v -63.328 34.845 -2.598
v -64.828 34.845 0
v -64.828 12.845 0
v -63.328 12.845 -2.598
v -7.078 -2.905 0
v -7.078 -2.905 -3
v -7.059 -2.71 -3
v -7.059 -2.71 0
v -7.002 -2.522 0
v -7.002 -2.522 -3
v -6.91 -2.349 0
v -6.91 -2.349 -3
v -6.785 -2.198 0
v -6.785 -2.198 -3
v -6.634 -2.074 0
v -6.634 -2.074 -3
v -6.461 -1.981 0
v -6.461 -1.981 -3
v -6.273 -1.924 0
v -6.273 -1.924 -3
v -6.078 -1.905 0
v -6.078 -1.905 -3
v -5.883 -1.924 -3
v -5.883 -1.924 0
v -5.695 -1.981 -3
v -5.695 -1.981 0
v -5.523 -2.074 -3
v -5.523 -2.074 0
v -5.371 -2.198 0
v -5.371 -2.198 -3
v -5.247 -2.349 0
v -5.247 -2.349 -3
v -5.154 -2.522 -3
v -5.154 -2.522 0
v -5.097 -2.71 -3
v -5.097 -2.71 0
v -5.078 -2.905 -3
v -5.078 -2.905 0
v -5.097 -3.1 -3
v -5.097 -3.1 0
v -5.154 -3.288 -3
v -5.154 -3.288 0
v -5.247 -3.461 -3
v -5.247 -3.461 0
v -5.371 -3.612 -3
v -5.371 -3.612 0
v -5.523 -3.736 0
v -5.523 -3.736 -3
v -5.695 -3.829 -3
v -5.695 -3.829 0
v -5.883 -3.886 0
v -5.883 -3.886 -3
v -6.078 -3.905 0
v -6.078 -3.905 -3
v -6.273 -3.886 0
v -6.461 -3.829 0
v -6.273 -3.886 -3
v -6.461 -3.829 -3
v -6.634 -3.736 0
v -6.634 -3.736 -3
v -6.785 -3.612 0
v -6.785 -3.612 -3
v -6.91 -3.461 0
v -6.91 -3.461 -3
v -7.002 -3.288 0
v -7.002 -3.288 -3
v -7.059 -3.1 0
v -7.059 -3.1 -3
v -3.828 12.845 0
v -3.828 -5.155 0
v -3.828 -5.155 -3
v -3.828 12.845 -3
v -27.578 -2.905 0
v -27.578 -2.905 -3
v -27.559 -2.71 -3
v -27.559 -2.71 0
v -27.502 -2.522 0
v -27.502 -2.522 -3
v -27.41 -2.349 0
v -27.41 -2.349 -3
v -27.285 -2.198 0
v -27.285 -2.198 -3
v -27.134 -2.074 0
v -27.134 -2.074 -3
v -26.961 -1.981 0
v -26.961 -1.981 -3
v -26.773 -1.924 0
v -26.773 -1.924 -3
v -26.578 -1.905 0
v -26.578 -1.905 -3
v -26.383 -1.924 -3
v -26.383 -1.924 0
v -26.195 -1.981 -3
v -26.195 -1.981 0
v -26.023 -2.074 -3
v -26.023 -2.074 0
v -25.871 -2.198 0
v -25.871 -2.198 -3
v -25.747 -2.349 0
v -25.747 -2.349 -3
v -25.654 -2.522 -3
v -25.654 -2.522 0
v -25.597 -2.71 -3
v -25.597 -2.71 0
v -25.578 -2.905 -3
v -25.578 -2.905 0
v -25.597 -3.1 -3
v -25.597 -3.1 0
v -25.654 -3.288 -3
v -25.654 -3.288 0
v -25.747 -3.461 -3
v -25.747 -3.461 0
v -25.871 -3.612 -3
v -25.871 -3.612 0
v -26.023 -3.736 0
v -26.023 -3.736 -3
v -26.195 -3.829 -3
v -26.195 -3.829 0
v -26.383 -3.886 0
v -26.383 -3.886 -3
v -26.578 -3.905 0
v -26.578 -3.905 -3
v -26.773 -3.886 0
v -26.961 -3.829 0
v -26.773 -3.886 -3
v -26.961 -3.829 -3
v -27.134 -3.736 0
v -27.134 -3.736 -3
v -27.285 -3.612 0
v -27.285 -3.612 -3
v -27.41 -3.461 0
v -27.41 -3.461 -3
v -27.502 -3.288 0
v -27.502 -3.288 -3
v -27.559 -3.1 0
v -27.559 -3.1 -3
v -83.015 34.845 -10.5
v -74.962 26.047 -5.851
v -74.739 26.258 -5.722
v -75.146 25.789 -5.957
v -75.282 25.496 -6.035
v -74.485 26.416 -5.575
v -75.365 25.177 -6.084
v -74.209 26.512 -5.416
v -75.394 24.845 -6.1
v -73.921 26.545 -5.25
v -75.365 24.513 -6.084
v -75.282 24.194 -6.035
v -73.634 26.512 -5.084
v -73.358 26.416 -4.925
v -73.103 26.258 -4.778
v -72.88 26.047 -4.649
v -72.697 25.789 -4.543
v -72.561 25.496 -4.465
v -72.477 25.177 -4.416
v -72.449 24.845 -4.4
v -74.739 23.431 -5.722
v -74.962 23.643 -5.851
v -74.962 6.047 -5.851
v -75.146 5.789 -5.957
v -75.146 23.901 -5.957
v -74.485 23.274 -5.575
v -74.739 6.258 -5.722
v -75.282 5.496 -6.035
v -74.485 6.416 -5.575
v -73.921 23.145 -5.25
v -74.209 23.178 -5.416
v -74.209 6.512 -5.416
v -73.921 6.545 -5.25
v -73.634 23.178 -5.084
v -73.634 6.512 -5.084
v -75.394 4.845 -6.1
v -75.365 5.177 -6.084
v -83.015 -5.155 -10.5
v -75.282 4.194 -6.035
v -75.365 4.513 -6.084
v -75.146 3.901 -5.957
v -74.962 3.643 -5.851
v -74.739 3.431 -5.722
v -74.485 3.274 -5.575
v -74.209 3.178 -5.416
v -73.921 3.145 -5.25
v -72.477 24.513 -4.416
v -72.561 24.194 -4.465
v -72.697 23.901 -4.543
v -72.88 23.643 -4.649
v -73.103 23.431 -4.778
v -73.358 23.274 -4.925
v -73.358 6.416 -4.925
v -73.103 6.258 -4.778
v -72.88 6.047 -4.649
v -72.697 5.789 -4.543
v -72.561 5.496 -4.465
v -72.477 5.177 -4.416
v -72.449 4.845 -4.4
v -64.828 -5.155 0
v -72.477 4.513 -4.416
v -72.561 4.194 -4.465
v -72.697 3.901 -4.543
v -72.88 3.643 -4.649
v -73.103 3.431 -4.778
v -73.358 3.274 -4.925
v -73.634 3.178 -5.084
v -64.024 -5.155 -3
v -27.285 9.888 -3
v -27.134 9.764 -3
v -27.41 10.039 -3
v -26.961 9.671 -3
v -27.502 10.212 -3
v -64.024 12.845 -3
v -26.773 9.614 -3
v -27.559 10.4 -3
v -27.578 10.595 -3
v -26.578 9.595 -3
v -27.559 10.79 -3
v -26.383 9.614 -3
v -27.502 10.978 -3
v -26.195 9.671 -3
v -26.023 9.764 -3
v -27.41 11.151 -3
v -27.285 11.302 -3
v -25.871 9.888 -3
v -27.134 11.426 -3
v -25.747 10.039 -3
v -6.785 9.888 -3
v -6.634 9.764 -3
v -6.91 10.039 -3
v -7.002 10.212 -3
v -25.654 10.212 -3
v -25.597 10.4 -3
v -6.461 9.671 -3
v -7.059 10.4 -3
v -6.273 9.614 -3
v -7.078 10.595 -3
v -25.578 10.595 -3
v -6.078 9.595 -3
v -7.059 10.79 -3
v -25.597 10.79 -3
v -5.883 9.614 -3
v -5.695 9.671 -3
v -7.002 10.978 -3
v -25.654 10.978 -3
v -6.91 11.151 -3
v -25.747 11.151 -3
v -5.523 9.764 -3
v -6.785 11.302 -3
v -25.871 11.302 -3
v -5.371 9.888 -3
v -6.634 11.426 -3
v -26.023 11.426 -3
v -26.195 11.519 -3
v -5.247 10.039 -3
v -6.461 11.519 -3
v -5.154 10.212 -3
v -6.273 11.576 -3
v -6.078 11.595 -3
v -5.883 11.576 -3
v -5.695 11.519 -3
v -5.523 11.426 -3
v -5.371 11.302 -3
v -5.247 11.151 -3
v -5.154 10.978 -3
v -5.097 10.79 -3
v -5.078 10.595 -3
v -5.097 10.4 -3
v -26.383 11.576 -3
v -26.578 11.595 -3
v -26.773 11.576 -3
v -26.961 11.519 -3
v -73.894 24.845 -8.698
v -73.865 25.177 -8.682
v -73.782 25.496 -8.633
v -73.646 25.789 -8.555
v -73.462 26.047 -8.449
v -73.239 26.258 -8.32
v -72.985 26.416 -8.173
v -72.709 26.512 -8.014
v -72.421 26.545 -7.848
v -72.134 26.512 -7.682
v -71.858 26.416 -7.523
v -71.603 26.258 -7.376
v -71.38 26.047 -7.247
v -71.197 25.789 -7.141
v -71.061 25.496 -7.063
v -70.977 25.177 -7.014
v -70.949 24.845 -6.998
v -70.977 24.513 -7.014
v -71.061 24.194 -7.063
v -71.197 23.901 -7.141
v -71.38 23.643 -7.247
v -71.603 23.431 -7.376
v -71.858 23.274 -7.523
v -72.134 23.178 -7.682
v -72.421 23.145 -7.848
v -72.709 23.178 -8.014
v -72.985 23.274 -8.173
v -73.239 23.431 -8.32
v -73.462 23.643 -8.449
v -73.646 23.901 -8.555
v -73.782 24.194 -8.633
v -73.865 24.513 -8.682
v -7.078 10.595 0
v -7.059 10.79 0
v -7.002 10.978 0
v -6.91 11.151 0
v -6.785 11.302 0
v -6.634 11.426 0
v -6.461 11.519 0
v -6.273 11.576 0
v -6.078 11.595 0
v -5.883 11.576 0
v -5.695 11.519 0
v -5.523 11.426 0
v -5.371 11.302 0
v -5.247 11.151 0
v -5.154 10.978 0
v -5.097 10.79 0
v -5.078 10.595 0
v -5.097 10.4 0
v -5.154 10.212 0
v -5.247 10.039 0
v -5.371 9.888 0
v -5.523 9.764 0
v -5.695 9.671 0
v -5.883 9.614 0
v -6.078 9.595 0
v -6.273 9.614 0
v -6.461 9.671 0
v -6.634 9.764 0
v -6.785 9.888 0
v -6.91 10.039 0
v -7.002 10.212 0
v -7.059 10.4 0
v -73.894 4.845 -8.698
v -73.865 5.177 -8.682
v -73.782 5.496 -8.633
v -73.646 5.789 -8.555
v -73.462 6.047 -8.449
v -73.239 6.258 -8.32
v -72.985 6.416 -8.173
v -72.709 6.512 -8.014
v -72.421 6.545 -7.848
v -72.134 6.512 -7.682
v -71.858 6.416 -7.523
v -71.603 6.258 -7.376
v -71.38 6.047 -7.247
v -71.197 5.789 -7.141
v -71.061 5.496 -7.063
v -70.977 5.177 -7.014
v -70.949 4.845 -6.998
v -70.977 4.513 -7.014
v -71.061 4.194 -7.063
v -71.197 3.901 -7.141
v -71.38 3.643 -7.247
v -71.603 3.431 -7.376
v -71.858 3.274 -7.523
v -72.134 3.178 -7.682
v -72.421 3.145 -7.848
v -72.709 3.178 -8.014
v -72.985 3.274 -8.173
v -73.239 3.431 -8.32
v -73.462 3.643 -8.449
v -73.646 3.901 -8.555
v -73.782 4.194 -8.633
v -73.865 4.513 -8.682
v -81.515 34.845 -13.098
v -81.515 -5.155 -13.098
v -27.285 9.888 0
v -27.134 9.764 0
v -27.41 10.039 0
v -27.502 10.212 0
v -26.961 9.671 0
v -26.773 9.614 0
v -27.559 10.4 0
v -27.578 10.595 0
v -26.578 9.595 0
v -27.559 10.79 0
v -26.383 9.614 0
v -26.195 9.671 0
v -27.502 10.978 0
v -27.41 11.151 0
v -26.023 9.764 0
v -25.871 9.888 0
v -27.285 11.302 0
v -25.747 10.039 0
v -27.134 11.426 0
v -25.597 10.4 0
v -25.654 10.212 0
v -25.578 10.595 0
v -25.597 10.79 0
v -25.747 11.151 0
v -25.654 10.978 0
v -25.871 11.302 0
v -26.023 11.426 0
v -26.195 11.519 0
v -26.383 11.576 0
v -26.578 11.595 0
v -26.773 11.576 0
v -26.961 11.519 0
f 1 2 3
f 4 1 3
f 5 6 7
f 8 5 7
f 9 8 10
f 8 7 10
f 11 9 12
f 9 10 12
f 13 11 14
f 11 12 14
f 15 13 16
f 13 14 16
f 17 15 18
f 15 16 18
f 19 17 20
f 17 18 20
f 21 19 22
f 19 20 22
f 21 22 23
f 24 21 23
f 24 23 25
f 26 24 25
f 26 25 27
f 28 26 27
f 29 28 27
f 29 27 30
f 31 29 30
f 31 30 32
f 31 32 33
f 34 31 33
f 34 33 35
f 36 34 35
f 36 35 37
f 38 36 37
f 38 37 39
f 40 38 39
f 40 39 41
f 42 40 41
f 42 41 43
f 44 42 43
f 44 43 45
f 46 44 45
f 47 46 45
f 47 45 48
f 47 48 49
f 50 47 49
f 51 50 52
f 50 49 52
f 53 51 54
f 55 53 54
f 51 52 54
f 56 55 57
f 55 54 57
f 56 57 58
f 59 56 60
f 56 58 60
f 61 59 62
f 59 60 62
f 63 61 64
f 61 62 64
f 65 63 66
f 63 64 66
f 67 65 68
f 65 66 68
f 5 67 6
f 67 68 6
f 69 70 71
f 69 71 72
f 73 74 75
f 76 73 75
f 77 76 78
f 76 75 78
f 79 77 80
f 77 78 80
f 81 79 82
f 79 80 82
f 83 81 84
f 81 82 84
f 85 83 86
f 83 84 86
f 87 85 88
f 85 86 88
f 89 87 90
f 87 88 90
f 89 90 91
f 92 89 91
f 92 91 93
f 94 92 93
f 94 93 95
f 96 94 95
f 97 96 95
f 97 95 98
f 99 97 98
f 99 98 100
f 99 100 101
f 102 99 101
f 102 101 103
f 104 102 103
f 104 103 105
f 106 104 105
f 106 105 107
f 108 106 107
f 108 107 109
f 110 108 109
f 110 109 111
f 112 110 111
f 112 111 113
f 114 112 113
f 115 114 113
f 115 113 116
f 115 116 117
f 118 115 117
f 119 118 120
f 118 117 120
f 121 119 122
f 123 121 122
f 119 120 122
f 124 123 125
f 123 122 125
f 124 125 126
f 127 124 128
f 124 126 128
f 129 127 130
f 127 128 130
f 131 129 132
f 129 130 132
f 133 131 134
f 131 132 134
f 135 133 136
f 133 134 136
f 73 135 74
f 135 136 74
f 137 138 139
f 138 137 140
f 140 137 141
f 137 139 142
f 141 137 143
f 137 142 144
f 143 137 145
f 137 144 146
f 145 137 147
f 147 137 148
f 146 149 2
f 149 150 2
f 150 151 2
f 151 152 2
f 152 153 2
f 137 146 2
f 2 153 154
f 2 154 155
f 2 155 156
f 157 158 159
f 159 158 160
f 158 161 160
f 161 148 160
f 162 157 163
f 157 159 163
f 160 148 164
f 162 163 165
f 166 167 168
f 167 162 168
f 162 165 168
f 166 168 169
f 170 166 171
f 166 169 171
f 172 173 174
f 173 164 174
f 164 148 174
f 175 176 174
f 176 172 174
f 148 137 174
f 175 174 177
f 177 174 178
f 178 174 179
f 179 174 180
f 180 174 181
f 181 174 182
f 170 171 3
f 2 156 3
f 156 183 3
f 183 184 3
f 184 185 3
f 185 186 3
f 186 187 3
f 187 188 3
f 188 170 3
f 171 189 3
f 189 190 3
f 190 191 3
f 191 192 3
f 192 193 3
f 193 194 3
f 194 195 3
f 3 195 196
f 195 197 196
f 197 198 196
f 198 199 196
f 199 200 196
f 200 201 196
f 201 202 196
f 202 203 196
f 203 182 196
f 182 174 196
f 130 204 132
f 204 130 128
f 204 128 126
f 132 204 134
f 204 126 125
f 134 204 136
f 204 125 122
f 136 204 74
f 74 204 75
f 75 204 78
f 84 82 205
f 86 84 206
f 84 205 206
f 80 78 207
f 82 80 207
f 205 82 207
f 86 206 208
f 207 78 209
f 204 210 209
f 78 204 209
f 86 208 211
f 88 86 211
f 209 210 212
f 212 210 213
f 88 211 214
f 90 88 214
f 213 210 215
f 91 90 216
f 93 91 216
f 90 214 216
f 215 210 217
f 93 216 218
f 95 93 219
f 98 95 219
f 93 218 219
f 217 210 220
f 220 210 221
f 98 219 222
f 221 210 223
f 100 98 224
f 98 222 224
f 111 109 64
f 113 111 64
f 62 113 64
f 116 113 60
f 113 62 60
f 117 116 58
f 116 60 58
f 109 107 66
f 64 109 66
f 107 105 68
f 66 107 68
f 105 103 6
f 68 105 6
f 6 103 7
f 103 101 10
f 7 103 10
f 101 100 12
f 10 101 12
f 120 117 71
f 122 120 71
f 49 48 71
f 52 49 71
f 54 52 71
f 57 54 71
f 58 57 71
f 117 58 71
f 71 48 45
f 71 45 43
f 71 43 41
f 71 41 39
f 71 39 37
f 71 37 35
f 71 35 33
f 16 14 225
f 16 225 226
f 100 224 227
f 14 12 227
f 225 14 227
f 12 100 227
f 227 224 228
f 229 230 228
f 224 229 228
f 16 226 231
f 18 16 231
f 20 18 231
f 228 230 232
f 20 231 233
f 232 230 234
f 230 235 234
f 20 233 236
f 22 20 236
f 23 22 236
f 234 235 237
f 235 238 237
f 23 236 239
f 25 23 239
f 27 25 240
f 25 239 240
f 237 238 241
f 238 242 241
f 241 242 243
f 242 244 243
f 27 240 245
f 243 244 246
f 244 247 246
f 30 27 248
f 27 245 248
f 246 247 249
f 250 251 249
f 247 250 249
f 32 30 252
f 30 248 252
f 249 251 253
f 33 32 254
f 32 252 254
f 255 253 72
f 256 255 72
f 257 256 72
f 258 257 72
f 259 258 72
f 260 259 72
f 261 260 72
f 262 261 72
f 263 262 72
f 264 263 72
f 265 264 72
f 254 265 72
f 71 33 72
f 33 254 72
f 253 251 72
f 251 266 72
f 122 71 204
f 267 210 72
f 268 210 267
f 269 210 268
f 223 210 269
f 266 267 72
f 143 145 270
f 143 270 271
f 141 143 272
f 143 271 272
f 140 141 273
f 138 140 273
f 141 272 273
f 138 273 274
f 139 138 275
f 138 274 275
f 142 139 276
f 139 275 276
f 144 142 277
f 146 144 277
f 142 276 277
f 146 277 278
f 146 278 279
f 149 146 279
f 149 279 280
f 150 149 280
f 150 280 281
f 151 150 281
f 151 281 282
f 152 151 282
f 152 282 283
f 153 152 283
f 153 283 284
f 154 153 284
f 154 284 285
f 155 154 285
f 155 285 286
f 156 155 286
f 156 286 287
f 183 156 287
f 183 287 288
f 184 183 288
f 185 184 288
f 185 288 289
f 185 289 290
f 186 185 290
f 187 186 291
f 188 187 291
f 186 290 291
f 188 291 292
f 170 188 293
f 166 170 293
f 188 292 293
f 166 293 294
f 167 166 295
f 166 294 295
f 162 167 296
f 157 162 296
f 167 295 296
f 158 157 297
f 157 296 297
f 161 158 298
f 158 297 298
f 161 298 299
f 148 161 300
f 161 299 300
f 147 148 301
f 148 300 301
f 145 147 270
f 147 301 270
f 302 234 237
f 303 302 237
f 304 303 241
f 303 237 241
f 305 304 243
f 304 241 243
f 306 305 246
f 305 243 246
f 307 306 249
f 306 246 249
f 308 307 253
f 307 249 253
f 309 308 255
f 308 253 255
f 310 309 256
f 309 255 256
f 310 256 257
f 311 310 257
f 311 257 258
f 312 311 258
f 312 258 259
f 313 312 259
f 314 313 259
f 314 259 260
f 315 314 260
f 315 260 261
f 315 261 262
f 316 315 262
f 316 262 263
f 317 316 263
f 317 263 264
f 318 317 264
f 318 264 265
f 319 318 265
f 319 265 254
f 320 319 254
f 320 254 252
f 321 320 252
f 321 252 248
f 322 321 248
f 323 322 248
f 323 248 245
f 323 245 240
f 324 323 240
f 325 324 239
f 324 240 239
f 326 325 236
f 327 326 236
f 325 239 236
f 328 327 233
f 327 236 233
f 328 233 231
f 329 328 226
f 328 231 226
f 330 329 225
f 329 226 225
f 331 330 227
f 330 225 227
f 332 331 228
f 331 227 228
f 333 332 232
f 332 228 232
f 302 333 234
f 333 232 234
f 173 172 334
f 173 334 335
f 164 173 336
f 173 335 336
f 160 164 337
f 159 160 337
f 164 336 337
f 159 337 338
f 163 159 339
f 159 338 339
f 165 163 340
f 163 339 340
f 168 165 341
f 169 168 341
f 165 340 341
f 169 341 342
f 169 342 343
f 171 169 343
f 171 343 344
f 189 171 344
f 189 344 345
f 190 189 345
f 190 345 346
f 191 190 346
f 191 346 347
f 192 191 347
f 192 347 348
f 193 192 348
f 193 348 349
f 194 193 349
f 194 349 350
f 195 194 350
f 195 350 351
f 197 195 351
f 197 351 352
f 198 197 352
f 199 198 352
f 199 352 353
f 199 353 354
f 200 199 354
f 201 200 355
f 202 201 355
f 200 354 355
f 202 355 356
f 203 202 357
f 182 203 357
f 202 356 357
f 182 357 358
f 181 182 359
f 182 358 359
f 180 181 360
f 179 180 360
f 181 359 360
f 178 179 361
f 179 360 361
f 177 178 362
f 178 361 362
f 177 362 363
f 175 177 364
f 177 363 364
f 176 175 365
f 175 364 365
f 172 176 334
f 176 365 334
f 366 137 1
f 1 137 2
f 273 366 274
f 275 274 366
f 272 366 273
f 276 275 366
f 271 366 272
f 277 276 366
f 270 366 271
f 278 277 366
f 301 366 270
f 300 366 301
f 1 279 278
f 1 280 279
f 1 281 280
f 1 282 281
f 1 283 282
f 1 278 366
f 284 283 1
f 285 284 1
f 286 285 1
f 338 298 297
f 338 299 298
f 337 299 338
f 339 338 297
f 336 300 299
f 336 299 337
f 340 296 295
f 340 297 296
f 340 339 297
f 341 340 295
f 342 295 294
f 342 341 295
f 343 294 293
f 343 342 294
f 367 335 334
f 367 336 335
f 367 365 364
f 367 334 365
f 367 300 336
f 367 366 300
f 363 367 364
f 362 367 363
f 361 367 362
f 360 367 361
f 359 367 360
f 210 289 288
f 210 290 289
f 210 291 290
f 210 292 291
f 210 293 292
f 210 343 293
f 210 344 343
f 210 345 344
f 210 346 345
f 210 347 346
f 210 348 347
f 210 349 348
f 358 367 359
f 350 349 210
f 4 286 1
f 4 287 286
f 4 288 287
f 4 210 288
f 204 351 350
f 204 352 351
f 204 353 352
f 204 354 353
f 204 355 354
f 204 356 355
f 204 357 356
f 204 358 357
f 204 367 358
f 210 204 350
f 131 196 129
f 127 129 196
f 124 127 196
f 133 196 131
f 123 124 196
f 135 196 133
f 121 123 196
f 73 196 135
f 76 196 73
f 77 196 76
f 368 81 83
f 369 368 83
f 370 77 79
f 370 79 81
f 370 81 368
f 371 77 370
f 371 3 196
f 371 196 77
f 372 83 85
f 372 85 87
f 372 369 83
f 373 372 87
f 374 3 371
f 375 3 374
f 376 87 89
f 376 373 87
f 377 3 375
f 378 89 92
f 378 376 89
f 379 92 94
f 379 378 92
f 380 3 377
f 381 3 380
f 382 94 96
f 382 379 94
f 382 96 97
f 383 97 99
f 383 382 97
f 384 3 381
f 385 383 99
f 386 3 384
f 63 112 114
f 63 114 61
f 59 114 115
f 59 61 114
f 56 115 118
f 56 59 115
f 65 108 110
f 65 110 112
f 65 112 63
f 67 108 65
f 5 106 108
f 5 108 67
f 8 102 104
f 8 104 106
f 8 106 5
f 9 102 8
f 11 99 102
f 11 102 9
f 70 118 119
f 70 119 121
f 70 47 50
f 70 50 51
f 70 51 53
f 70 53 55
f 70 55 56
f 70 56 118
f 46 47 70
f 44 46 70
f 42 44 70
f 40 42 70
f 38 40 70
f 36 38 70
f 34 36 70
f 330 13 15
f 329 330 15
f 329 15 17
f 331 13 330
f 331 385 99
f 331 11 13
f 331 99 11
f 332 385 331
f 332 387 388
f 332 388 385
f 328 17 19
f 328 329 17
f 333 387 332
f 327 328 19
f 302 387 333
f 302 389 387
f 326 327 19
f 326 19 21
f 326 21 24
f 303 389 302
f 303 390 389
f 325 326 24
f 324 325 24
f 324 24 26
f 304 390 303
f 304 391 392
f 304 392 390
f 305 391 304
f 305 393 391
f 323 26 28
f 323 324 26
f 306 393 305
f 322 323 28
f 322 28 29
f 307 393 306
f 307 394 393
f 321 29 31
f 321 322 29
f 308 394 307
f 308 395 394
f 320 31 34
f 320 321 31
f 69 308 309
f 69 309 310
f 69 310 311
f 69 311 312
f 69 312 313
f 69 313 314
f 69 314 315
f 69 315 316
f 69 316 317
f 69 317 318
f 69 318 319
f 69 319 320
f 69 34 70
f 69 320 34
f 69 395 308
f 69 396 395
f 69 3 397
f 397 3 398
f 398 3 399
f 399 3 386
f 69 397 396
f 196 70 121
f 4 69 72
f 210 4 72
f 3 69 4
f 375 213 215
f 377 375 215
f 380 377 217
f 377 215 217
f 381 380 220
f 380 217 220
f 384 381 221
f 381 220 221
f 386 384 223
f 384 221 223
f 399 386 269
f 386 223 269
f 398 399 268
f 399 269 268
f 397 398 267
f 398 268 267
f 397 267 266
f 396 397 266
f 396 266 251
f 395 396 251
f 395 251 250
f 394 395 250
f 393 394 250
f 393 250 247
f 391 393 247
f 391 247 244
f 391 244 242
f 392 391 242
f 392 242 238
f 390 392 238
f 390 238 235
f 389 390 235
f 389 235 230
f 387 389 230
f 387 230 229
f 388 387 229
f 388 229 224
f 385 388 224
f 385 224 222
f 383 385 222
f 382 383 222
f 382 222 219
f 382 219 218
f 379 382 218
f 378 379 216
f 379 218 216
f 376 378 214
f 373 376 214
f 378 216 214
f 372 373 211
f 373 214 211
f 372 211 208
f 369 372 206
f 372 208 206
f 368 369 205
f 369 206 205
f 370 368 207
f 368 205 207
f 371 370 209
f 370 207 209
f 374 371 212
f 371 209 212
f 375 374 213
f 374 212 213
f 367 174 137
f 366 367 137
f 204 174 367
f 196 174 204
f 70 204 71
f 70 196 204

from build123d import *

# Parameters (mm, degrees)
F0_W     = 25
F0_H     = 18
F0_W_2   = 36
F1_DEPTH = 3
F2_D     = 2
F2_DEPTH = 8
F2_TIP   = 0.600860619
F4_W     = 21
F4_H     = 18
F4_H_2   = 22
F5_DEPTH = 3
F6_D     = 3.4
F6_DEPTH = 8
F6_TIP   = 1.0214630523


with BuildPart() as f1:
    # F0 (on Top) → F1 (new body)
    with BuildSketch(Plane.XY):
        with Locations((-16.3281254843, 3.8449834271)):
            Rectangle(F0_W, F0_H)
        with Locations((-46.8281254843, 3.8449834271)):
            Rectangle(F0_W_2, F0_H)
    extrude(amount=-F1_DEPTH)

    # F2
    with Locations(Plane.XY):
        with Locations((-26.5781254843, 10.5949834271), (-6.0781254843, 10.5949834271), (-6.0781254843, -2.9050165729), (-26.5781254843, -2.9050165729)):
            Hole(F2_D / 2, depth=F2_DEPTH)
            with Locations((0, 0, -(F2_DEPTH + F2_TIP / 2))):  # 118° drill point
                Cone(0, F2_D / 2, F2_TIP, mode=Mode.SUBTRACT)

    # F4 (on line) → F5 (join)
    with BuildSketch(Plane(origin=(-16.2070313711, 0, 28.0714017746), x_dir=(0.8660254038, 0, 0.5), z_dir=(0.5, 0, -0.8660254038))):
        with Locations((-66.6428035491, -3.8449834271)):
            Rectangle(F4_W, F4_H)
        with Locations((-66.6428035491, -23.8449834271)):
            Rectangle(F4_W, F4_H_2)
    extrude(amount=F5_DEPTH)

    # F6
    with Locations(Plane(origin=(-16.2070313711, 0, 28.0714017746), x_dir=(0.8660254038, 0, 0.5), z_dir=(-0.5, 0, 0.8660254038))):
        with Locations((-66.6428035491, 24.8449834271), (-66.6428035491, 4.8449834271)):
            Hole(F6_D / 2, depth=F6_DEPTH)
            with Locations((0, 0, -(F6_DEPTH + F6_TIP / 2))):  # 118° drill point
                Cone(0, F6_D / 2, F6_TIP, mode=Mode.SUBTRACT)


solid = f1.part
